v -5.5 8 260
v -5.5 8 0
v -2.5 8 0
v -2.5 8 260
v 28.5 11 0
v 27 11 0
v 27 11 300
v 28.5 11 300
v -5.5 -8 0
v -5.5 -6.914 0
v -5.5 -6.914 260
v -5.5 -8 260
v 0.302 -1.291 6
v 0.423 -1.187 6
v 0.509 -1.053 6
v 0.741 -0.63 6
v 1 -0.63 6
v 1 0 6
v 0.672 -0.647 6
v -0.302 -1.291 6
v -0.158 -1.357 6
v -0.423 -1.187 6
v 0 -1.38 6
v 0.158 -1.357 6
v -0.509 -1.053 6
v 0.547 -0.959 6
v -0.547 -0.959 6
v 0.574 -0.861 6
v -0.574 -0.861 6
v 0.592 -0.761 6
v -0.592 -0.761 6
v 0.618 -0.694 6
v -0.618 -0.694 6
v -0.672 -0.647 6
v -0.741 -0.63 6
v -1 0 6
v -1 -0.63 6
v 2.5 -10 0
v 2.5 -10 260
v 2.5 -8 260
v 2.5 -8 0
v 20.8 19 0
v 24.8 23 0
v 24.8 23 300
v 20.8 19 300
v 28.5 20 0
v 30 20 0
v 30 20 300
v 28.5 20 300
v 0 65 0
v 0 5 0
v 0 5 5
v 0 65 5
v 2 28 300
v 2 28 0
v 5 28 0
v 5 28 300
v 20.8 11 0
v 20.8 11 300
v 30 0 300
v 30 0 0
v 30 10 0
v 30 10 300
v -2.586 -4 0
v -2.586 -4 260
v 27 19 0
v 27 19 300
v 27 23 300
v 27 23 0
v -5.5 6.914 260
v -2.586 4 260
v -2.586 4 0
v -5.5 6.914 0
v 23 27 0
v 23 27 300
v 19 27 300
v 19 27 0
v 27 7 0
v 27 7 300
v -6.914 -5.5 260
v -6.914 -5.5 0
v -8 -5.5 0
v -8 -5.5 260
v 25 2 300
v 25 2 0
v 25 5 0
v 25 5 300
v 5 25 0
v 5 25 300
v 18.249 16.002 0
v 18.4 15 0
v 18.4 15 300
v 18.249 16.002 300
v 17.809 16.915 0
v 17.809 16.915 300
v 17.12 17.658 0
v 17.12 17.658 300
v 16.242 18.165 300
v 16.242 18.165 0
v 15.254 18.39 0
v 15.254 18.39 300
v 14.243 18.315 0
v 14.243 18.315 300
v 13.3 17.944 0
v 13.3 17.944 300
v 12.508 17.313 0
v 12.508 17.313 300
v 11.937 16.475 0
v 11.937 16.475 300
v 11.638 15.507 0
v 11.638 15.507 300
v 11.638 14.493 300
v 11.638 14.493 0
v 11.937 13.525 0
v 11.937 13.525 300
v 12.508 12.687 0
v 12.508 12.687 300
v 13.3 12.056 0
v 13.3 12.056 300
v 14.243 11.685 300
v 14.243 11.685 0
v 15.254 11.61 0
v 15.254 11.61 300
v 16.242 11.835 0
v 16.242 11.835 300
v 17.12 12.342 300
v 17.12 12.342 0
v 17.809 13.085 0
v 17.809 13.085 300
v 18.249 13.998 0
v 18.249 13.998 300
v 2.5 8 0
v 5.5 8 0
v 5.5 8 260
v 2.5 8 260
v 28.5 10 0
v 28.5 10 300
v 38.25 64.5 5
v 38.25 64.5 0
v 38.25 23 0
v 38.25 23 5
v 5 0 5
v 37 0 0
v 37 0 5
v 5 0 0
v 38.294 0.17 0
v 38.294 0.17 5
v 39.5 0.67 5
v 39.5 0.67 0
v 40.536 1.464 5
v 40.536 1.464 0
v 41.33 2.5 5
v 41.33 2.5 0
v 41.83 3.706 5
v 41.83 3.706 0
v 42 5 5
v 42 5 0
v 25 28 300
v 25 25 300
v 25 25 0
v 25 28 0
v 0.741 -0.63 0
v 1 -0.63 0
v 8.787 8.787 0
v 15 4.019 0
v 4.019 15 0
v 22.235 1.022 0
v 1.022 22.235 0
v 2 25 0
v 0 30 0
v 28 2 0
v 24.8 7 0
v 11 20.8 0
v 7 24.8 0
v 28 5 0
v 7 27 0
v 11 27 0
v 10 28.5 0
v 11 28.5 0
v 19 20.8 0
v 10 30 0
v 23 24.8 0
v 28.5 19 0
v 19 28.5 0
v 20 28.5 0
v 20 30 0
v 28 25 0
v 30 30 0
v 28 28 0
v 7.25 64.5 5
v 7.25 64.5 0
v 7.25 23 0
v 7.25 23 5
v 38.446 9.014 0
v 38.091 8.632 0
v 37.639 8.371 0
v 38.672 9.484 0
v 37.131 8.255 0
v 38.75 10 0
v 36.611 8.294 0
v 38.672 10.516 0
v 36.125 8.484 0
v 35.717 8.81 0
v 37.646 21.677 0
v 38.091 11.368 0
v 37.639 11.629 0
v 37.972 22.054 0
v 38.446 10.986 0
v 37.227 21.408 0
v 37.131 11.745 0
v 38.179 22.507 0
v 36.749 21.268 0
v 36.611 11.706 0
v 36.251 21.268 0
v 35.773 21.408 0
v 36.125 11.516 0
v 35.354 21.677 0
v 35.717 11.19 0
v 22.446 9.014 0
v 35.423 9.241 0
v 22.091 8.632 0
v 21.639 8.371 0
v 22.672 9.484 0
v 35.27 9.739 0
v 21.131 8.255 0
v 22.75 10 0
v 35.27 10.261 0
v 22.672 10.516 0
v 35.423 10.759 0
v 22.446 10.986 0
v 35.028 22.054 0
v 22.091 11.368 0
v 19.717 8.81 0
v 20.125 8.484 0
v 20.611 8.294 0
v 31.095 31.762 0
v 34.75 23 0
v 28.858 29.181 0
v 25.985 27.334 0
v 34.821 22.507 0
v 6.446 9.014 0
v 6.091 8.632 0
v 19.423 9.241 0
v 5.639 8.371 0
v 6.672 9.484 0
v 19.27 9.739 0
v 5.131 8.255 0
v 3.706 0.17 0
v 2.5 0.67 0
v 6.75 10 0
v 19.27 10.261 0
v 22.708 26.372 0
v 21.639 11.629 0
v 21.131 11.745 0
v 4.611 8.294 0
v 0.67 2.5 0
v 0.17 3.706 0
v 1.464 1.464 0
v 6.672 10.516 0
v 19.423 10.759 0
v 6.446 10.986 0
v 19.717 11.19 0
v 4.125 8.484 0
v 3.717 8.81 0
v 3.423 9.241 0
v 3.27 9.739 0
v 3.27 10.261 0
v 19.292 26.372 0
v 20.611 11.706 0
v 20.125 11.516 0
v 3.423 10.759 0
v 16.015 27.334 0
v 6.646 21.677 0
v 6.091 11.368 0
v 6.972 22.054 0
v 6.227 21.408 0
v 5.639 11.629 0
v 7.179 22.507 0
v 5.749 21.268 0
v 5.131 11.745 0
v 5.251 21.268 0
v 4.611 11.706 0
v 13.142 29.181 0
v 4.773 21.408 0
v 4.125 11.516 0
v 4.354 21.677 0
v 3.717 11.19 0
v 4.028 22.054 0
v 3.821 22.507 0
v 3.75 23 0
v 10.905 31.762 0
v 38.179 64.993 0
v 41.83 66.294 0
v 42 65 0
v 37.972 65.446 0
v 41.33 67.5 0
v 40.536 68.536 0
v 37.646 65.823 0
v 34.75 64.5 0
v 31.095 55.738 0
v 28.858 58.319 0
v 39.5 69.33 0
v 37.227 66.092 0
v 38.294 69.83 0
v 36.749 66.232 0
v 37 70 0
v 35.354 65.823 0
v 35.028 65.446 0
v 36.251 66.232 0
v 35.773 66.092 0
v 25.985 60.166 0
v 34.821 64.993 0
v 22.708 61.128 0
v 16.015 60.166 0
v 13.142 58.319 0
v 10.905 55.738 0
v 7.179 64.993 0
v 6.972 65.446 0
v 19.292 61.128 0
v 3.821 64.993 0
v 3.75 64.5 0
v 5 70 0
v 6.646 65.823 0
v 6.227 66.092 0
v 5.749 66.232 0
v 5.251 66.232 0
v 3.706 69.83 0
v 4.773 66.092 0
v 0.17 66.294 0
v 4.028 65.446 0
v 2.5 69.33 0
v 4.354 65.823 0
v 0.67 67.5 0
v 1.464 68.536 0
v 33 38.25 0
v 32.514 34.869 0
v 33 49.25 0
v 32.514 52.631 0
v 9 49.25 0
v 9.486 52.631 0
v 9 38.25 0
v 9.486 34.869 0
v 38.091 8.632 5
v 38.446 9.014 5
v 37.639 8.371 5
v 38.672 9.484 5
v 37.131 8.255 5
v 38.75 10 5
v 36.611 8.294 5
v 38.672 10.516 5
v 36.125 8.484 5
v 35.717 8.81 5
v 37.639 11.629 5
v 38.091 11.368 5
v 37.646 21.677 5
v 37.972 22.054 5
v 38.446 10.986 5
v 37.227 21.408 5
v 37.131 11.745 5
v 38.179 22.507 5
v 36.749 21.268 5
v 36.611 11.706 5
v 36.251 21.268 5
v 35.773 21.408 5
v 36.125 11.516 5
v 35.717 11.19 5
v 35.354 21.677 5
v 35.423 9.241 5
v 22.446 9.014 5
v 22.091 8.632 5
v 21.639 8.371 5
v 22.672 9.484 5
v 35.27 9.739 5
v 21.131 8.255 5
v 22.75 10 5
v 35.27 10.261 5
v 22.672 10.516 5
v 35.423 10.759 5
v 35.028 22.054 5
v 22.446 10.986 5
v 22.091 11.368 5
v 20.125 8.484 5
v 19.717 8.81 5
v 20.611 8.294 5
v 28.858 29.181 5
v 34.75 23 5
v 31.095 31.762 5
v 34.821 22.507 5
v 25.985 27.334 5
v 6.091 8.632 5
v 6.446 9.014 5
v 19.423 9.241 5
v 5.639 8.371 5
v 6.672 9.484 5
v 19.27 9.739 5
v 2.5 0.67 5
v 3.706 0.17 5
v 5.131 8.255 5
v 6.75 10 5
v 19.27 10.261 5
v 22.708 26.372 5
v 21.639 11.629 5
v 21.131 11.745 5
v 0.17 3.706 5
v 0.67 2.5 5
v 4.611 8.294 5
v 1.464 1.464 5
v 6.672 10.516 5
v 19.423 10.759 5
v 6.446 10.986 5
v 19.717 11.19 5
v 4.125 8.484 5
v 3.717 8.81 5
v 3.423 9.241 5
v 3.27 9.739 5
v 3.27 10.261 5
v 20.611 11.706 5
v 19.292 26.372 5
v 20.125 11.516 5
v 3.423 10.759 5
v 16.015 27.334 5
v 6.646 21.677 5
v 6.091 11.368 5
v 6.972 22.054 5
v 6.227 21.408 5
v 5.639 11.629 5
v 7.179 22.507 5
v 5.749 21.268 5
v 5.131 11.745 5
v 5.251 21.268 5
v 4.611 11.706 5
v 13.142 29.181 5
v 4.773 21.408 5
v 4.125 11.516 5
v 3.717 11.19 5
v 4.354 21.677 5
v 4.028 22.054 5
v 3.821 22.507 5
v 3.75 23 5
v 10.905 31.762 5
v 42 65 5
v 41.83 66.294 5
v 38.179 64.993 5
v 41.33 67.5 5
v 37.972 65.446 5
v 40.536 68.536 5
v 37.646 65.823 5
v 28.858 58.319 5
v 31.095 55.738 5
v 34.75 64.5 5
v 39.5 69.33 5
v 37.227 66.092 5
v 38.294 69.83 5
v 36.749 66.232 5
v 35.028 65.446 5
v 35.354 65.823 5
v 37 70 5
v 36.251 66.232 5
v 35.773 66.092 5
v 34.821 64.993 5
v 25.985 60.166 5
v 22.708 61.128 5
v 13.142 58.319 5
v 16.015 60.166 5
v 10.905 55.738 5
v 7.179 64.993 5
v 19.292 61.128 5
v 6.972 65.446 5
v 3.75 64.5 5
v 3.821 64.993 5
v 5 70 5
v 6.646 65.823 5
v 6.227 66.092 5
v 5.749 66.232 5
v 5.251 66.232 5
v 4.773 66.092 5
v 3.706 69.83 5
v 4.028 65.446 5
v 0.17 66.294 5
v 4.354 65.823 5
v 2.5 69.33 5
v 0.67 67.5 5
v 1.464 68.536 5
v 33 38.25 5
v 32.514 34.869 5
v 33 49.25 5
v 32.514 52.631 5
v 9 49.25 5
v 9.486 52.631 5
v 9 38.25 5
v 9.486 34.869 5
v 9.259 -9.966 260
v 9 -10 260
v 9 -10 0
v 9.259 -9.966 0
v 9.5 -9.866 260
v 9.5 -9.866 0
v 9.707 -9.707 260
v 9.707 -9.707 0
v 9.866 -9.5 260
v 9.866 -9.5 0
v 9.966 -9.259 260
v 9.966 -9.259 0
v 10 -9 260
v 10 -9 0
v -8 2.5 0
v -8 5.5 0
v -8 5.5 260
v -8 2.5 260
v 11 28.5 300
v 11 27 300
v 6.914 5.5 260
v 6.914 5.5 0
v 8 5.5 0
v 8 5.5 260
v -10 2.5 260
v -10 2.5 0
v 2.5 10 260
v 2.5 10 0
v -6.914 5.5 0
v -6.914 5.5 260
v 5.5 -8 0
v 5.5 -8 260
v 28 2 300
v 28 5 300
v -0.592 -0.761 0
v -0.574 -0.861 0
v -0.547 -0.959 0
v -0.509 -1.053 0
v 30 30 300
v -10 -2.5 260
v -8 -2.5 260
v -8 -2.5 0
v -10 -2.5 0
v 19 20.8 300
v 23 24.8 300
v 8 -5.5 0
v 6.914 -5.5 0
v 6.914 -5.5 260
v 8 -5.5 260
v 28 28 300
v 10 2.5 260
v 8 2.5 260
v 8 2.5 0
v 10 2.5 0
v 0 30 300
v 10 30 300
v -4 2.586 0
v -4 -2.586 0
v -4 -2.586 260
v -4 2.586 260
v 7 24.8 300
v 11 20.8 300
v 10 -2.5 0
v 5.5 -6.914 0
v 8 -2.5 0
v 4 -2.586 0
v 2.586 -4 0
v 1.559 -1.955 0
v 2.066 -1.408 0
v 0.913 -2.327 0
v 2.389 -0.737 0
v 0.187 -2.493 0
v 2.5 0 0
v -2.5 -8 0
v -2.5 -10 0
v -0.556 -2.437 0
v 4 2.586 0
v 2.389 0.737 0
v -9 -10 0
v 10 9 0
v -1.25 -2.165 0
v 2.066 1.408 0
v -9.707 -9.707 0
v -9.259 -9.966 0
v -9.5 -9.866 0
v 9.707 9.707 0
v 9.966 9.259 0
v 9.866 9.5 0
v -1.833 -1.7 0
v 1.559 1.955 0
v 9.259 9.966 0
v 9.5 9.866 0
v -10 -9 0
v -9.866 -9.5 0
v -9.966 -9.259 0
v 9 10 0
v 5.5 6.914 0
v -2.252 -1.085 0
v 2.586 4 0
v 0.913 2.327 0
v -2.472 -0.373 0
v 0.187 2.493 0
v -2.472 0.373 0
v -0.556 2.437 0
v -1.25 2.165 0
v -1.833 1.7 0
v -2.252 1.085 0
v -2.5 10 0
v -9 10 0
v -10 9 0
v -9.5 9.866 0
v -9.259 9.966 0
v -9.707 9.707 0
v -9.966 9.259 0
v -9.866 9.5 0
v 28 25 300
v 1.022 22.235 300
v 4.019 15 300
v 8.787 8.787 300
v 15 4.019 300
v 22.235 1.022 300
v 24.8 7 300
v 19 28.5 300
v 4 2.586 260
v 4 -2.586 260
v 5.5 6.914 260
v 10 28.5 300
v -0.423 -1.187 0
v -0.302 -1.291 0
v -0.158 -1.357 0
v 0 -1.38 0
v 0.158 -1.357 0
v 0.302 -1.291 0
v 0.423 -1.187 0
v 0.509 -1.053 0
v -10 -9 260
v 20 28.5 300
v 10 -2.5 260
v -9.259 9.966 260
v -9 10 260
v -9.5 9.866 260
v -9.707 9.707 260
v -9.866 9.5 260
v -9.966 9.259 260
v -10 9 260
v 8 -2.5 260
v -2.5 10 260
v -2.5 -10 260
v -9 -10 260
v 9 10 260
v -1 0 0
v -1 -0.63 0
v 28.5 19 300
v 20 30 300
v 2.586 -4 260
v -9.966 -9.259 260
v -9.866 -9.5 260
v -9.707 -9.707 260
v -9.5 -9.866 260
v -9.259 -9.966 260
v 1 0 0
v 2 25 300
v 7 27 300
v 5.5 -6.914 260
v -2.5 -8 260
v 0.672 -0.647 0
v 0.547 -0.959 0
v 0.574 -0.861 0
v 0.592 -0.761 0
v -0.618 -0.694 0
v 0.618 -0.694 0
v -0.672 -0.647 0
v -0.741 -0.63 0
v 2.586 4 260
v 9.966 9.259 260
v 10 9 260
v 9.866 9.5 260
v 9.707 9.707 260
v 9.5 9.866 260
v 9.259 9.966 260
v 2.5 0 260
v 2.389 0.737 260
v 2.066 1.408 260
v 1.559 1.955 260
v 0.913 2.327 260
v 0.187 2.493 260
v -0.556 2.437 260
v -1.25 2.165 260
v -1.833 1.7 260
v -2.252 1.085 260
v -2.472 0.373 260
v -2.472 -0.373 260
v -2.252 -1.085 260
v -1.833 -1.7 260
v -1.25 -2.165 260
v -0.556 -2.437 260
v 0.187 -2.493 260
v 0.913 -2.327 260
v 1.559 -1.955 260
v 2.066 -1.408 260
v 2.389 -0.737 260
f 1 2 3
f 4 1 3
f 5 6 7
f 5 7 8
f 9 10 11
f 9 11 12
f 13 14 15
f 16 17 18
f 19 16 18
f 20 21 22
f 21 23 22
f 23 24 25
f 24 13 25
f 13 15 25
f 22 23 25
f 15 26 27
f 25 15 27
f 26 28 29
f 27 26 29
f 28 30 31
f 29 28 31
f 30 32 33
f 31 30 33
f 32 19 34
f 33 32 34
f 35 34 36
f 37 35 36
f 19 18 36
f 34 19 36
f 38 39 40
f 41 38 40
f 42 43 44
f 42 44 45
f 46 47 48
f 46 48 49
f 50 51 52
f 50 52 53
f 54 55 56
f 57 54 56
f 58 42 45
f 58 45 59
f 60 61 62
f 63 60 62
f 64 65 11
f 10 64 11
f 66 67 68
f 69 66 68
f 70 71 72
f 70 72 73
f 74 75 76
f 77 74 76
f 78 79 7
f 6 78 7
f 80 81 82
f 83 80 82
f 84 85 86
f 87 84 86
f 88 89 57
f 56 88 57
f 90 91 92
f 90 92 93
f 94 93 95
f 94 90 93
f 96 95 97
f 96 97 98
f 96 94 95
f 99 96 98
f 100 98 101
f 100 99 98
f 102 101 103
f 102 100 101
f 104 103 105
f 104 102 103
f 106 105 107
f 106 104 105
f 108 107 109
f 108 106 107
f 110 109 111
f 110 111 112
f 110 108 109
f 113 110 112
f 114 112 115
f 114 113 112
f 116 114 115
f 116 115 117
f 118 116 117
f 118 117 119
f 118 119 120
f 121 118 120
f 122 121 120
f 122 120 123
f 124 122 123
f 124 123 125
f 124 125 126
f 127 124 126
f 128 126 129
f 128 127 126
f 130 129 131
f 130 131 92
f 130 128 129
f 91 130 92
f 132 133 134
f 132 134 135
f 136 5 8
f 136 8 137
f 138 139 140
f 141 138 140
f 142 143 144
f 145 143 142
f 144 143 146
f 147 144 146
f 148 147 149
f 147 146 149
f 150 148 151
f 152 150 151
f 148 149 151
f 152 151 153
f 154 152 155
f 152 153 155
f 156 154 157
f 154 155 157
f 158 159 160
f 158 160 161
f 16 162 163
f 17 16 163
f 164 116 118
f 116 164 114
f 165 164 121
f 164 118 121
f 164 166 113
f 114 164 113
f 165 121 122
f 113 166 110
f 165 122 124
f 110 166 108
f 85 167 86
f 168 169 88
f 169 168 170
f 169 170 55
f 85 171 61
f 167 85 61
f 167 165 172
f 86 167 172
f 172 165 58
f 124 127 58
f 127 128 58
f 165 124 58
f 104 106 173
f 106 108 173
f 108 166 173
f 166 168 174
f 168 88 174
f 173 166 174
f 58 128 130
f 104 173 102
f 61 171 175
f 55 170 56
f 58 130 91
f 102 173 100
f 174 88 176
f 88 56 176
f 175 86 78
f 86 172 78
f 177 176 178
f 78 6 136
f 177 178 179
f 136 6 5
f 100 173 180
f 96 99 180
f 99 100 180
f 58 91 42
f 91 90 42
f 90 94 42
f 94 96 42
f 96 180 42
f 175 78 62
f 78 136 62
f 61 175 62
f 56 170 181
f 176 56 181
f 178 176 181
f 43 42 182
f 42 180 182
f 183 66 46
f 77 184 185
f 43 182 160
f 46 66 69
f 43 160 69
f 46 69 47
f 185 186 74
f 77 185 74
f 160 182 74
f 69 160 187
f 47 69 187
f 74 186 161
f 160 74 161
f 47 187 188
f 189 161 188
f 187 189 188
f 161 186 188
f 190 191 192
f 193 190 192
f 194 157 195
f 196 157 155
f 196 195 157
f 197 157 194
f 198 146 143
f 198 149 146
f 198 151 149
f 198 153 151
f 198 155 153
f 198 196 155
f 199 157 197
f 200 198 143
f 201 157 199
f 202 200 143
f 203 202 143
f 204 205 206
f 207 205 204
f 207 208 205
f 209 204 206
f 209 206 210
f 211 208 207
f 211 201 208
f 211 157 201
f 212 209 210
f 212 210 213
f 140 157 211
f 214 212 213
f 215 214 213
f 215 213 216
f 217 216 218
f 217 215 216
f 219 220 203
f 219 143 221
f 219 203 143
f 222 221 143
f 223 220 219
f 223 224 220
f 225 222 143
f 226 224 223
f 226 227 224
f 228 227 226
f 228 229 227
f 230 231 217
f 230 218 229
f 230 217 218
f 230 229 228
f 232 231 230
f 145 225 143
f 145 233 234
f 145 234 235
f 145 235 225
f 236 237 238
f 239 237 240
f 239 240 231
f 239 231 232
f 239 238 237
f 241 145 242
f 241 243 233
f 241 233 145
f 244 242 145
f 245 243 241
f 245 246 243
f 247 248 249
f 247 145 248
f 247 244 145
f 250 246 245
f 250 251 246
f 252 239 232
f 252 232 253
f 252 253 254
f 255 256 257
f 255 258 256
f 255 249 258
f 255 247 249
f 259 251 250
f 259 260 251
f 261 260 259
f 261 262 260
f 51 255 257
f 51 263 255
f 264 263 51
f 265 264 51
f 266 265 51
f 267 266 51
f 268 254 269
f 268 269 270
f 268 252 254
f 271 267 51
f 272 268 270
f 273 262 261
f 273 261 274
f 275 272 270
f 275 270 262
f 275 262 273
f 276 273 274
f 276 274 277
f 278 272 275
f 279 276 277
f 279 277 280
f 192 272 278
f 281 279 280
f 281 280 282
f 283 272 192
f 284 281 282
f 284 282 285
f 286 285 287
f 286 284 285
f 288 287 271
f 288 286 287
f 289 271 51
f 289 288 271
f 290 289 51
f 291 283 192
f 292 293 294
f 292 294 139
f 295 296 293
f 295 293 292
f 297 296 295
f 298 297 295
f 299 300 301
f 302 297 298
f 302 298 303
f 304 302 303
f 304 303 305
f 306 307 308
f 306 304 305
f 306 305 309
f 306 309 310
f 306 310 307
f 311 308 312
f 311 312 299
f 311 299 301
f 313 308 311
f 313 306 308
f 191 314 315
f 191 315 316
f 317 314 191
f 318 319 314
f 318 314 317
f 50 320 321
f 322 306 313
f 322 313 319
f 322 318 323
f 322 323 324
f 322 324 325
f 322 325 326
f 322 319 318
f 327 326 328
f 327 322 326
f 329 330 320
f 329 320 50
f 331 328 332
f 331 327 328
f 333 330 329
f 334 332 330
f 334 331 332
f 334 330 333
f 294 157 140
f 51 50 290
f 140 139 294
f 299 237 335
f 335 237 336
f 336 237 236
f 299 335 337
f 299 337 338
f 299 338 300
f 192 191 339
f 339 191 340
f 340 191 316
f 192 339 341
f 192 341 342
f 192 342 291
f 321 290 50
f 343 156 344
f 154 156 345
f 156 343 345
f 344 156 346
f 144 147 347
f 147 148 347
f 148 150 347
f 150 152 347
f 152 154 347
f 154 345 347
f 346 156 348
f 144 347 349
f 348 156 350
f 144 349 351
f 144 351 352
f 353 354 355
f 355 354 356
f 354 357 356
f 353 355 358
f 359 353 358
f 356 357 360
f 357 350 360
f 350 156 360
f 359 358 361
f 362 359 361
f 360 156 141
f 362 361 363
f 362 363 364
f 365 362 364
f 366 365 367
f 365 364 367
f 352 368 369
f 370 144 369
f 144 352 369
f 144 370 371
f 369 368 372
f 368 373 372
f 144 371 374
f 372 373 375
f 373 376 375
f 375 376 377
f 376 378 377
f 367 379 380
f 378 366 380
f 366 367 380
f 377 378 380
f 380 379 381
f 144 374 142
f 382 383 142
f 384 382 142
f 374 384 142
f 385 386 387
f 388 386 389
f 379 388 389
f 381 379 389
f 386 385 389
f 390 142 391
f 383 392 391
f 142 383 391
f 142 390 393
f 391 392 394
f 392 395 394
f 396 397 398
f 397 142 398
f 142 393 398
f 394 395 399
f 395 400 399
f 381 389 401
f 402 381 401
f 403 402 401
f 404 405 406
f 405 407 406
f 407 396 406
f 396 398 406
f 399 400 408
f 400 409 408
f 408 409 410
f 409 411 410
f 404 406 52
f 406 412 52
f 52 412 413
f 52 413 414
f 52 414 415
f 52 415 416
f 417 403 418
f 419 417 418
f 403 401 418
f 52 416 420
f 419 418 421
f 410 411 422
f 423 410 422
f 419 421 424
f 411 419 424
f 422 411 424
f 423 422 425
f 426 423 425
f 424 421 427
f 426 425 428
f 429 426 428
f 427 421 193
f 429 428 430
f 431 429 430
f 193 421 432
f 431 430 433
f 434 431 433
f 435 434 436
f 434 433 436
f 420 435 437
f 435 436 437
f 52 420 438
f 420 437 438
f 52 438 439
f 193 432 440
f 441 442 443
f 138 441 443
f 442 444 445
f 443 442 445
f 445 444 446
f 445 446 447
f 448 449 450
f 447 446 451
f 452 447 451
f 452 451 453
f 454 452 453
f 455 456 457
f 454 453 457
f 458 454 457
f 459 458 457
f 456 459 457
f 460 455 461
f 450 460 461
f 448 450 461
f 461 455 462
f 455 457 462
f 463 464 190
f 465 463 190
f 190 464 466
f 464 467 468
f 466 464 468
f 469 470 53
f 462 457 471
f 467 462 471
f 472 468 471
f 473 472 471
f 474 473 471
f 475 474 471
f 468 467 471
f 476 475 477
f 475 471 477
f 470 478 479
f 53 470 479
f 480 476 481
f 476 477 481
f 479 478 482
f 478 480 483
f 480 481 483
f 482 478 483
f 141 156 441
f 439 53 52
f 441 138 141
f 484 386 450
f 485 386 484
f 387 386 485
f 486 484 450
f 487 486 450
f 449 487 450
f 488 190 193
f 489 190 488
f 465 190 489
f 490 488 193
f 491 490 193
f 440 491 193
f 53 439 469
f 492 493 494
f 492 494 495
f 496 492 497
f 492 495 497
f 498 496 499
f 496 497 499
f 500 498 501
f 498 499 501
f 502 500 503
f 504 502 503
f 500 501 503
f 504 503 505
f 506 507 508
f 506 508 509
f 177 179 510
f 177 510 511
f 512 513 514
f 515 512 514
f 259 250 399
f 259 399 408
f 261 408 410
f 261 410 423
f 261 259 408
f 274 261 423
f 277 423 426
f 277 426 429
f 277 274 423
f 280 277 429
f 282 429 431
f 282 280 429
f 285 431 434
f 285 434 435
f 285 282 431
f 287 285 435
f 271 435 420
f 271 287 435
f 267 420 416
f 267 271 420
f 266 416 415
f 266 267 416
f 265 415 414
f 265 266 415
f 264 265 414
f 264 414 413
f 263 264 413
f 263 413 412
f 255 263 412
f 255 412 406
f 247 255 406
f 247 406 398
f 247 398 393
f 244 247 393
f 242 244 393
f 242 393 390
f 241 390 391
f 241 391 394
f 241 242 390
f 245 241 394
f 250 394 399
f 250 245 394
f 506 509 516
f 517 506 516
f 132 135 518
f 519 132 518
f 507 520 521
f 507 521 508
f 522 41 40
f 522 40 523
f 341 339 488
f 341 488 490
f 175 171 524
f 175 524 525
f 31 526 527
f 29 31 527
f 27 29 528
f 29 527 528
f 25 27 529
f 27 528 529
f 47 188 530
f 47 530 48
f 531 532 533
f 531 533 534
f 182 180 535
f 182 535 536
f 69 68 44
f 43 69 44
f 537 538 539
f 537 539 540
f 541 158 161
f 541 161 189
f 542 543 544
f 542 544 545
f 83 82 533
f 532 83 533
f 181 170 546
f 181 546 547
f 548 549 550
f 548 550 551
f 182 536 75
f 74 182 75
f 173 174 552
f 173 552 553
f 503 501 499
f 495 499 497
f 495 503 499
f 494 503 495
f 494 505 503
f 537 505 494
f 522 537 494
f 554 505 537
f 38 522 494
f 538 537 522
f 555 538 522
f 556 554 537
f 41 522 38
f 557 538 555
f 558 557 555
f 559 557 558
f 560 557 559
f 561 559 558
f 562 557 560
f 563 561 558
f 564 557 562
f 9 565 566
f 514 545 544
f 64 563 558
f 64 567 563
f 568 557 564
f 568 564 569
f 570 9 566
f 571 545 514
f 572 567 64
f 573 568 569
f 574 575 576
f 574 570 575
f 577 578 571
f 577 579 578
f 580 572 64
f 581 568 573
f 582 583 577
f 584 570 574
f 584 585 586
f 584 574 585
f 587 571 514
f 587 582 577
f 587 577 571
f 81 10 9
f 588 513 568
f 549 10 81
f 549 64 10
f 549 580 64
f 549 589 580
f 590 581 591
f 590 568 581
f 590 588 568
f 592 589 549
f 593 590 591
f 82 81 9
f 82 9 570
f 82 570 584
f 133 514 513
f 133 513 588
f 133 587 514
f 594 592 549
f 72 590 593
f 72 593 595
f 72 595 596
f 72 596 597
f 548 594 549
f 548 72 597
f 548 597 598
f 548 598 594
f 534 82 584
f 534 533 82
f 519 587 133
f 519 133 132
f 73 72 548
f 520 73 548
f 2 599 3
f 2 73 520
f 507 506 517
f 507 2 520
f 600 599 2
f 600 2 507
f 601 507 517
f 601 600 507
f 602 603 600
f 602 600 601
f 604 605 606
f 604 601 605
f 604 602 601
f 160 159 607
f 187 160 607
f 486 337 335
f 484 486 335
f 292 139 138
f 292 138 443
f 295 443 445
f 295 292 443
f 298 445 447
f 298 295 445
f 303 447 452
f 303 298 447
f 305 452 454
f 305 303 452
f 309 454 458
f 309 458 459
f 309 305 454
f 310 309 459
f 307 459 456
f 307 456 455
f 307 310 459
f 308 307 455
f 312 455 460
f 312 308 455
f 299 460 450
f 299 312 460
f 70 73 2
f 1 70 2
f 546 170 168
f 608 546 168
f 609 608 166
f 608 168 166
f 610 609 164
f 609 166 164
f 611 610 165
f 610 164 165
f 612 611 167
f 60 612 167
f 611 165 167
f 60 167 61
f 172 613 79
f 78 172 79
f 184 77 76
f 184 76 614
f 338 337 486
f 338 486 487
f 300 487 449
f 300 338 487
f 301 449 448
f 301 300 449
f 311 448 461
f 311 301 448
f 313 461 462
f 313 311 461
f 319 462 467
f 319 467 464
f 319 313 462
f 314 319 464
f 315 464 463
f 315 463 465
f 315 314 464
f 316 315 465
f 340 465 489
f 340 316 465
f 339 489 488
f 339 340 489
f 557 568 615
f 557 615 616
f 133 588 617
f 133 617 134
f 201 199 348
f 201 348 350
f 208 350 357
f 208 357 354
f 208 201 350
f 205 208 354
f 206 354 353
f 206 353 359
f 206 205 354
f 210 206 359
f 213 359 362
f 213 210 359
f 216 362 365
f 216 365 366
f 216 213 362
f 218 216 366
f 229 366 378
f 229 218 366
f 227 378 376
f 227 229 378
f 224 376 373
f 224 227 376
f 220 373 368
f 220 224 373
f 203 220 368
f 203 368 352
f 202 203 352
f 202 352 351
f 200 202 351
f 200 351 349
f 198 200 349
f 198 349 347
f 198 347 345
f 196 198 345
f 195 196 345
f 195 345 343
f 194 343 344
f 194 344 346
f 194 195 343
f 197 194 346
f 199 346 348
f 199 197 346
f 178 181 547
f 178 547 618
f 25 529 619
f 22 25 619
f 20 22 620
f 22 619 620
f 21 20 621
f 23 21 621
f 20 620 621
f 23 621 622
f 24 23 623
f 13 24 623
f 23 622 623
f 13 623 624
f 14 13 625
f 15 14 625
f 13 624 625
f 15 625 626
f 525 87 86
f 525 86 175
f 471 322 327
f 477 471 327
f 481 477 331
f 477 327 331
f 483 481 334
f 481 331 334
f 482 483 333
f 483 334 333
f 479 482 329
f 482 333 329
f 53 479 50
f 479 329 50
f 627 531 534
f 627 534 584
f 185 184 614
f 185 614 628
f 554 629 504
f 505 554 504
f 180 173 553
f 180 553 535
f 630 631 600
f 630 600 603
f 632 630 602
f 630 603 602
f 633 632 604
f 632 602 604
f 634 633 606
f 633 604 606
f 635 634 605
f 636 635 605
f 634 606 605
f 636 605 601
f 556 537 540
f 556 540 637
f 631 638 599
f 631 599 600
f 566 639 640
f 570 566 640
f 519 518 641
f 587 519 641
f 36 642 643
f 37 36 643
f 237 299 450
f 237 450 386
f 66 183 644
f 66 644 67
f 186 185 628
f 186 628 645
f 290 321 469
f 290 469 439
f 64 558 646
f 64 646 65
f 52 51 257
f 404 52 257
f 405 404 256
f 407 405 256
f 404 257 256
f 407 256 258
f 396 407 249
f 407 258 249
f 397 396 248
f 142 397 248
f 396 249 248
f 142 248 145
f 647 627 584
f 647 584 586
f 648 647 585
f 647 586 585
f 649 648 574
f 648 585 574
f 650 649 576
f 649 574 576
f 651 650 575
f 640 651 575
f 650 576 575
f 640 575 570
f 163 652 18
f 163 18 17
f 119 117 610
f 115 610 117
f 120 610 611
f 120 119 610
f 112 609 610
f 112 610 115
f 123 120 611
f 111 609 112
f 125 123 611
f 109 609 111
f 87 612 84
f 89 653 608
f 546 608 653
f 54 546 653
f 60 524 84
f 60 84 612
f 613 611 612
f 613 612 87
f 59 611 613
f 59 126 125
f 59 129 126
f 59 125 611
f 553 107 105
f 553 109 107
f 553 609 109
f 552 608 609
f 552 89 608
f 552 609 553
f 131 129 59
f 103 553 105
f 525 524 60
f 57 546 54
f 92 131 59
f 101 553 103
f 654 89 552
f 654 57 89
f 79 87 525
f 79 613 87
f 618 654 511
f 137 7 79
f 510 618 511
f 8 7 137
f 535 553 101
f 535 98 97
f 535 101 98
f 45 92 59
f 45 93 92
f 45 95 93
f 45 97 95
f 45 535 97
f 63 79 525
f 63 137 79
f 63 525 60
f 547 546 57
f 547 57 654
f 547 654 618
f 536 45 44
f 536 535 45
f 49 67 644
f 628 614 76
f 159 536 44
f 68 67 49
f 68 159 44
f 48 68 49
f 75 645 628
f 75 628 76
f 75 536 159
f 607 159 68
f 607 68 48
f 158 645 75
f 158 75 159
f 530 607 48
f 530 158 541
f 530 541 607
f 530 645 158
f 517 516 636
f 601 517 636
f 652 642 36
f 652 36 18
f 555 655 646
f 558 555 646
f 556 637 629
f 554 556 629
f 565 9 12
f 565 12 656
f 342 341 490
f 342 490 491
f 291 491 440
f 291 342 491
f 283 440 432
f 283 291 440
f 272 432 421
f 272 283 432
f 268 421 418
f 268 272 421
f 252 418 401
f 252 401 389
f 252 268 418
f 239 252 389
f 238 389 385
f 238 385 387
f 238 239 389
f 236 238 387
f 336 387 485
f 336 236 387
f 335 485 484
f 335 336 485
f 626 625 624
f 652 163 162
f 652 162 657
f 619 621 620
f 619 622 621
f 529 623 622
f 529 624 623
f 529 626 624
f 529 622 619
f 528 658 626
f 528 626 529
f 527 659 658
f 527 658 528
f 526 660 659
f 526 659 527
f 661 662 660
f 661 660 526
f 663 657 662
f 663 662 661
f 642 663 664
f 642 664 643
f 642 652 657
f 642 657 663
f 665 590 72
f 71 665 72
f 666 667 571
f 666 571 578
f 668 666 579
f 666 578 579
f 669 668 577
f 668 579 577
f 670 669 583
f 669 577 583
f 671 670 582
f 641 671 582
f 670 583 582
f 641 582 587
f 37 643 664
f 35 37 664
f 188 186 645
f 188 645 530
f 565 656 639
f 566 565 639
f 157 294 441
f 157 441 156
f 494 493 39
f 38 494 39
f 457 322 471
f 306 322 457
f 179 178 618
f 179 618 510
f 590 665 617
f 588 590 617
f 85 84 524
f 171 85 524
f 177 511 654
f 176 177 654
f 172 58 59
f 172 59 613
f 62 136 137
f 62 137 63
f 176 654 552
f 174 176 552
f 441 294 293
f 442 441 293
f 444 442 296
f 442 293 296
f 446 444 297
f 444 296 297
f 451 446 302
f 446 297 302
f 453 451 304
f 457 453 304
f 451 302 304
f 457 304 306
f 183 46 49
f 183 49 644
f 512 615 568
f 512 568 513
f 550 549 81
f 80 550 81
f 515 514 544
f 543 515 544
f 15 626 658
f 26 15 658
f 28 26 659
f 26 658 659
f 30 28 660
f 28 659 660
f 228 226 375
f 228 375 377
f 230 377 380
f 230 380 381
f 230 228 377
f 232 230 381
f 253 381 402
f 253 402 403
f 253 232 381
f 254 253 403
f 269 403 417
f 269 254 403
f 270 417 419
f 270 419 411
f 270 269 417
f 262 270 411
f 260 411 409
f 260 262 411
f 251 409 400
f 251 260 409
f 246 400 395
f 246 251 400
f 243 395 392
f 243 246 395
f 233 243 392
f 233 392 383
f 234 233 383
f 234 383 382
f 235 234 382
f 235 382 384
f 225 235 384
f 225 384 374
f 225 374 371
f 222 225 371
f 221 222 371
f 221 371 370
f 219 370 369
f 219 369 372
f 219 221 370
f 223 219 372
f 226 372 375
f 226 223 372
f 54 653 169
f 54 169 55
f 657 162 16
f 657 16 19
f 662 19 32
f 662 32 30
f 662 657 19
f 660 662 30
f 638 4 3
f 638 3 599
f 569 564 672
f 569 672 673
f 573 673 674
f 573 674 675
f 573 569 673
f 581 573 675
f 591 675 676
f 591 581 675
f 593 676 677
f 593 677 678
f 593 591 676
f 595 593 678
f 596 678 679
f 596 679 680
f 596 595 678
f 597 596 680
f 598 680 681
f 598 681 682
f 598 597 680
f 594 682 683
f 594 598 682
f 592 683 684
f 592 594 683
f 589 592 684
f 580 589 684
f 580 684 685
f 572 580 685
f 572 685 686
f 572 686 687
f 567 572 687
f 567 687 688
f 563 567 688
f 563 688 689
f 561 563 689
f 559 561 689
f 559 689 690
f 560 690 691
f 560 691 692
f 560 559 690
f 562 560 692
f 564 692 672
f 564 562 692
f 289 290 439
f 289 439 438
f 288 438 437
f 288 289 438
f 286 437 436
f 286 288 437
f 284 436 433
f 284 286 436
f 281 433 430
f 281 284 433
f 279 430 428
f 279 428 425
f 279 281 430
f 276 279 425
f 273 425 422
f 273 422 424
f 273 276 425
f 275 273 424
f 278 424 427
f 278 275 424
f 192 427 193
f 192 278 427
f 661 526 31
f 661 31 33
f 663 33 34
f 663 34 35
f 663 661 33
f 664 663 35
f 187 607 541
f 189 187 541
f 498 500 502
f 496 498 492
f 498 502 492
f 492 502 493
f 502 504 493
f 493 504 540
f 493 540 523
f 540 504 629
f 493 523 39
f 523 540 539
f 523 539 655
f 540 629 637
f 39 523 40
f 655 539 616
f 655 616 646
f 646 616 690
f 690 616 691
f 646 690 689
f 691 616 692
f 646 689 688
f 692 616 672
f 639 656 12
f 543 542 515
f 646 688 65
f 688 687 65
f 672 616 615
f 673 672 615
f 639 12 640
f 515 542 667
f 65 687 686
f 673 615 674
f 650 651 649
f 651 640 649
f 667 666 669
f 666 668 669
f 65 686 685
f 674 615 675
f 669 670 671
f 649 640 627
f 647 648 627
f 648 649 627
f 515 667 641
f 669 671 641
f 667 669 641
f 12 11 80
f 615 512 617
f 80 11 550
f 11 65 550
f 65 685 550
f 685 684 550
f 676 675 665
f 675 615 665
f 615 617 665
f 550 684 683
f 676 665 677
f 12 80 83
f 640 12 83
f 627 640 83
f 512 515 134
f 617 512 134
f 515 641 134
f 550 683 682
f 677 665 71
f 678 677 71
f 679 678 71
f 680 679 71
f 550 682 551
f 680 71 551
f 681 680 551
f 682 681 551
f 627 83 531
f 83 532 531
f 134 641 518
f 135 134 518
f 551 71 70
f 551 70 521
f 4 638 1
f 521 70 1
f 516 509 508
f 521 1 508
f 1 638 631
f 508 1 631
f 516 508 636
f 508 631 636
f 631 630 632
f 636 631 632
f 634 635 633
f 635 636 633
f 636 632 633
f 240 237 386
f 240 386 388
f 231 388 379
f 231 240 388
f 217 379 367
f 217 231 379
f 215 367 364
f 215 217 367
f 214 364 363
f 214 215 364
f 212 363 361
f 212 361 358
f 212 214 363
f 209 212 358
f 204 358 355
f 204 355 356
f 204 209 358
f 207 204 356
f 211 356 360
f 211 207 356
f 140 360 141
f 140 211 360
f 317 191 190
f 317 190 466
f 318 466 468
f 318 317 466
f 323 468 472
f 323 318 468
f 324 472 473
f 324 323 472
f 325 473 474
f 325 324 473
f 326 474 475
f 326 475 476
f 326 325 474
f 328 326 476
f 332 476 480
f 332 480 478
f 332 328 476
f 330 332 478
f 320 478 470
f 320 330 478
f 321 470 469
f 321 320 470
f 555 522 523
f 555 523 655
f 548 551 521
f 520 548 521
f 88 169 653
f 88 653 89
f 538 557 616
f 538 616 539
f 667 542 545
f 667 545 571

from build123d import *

# Parameters (mm, degrees)
SKETCH_R     = 1.75
PAD_DEPTH    = 5
SKETCH003_R  = 3.4
SKETCH003_W  = 3
SKETCH003_H  = 3
PAD001_DEPTH = 300
PAD002_DEPTH = 6
SKETCH005_R  = 2.5
PAD003_DEPTH = 260


with BuildPart() as nemamount:
    # Sketch → Pad (new body)
    with BuildSketch(Plane.XY):
        with BuildLine():
            Line((5, 70), (37, 70))
            ThreePointArc((42, 65), (40.535534, 68.535534), (37, 70))
            Line((42, 65), (42, 5))
            ThreePointArc((37, 0), (40.535534, 1.464466), (42, 5))
            Line((37, 0), (5, 0))
            ThreePointArc((0, 5), (1.464466, 1.464466), (5, 0))
            Line((0, 5), (0, 65))
            ThreePointArc((5, 70), (1.464466, 68.535534), (0, 65))
        make_face()
        with Locations((5, 10)):
            Circle(SKETCH_R, mode=Mode.SUBTRACT)
        with Locations((37, 10)):
            Circle(SKETCH_R, mode=Mode.SUBTRACT)
        with Locations((21, 10)):
            Circle(SKETCH_R, mode=Mode.SUBTRACT)
        with BuildLine():
            ThreePointArc((7.25, 64.5), (5.5, 66.25), (3.75, 64.5))
            Line((3.75, 64.5), (3.75, 23))
            ThreePointArc((3.75, 23), (5.5, 21.25), (7.25, 23))
            Line((7.25, 64.5), (7.25, 23))
        make_face(mode=Mode.SUBTRACT)
        with BuildLine():
            ThreePointArc((38.25, 64.5), (36.5, 66.25), (34.75, 64.5))
            Line((34.75, 64.5), (34.75, 23))
            ThreePointArc((34.75, 23), (36.5, 21.25), (38.25, 23))
            Line((38.25, 64.5), (38.25, 23))
        make_face(mode=Mode.SUBTRACT)
        with BuildLine():
            ThreePointArc((33, 49.25), (21, 61.25), (9, 49.25))
            Line((9, 49.25), (9, 38.25))
            ThreePointArc((9, 38.25), (21, 26.25), (33, 38.25))
            Line((33, 49.25), (33, 38.25))
        make_face(mode=Mode.SUBTRACT)
    extrude(amount=PAD_DEPTH)


with BuildPart() as profile3030r:
    # Sketch003 → Pad001 (new body)
    with BuildSketch(Plane.XY):
        with BuildLine():
            ThreePointArc((0, 30), (8.786797, 8.786797), (30, 0))
            Line((30, 0), (30, 10))
            Line((28.5, 10), (30, 10))
            Line((28.5, 11), (28.5, 10))
            Line((27, 11), (28.5, 11))
            Line((27, 7), (27, 11))
            Line((24.8, 7), (27, 7))
            Line((20.8, 11), (24.8, 7))
            Line((20.8, 19), (20.8, 11))
            Line((24.8, 23), (20.8, 19))
            Line((27, 23), (24.8, 23))
            Line((27, 19), (27, 23))
            Line((28.5, 19), (27, 19))
            Line((28.5, 20), (28.5, 19))
            Line((30, 20), (28.5, 20))
            Line((30, 30), (30, 20))
            Line((20, 30), (30, 30))
            Line((20, 28.5), (20, 30))
            Line((19, 28.5), (20, 28.5))
            Line((19, 27), (19, 28.5))
            Line((23, 27), (19, 27))
            Line((23, 24.8), (23, 27))
            Line((19, 20.8), (23, 24.8))
            Line((11, 20.8), (19, 20.8))
            Line((7, 24.8), (11, 20.8))
            Line((7, 27), (7, 24.8))
            Line((11, 27), (7, 27))
            Line((11, 28.5), (11, 27))
            Line((10, 28.5), (11, 28.5))
            Line((10, 30), (10, 28.5))
            Line((0, 30), (10, 30))
        make_face()
        with Locations((15, 15)):
            Circle(SKETCH003_R, mode=Mode.SUBTRACT)
        with Locations((3.5, 26.5)):
            Rectangle(SKETCH003_W, SKETCH003_H, mode=Mode.SUBTRACT)
        with Locations((26.5, 26.5)):
            Rectangle(SKETCH003_W, SKETCH003_H, mode=Mode.SUBTRACT)
        with Locations((26.5, 3.5)):
            Rectangle(SKETCH003_W, SKETCH003_H, mode=Mode.SUBTRACT)
    extrude(amount=PAD001_DEPTH)


with BuildPart() as gt2belt:
    # Sketch004 → Pad002 (new body)
    with BuildSketch(Plane.XY):
        with BuildLine():
            Line((-1, 0), (0, 0))
            Line((0, 0), (1, 0))
            Line((1, 0), (1, -0.63))
            Line((0.741036, -0.63), (1, -0.63))
            ThreePointArc((0.741036, -0.63), (0.641799, -0.667519), (0.592206, -0.761308))
            ThreePointArc((0.509091, -1.053295), (0.561793, -0.910474), (0.592206, -0.761308))
            ThreePointArc((-0.509091, -1.053295), (0, -1.38), (0.509091, -1.053295))
            ThreePointArc((-0.592206, -0.761308), (-0.561793, -0.910474), (-0.509091, -1.053295))
            ThreePointArc((-0.592206, -0.761308), (-0.641799, -0.667519), (-0.741036, -0.63))
            Line((-1, -0.63), (-0.741036, -0.63))
            Line((-1, 0), (-1, -0.63))
        make_face()
    extrude(amount=PAD002_DEPTH)


with BuildPart() as profile2020:
    # Sketch005 → Pad003 (new body)
    with BuildSketch(Plane.XY):
        with BuildLine():
            Line((-4, -2.585786), (-4, 2.585787))
            Line((-4, 2.585787), (-6.914214, 5.500001))
            Line((-6.914214, 5.500001), (-8, 5.500001))
            Line((-8, 5.500001), (-8, 2.500001))
            Line((-8, 2.500001), (-10, 2.500001))
            Line((-10, 2.500001), (-10, 9.000001))
            ThreePointArc((-9, 10), (-9.707107, 9.707107), (-10, 9.000001))
            Line((-2.5, 10), (-9, 10))
            Line((-2.5, 8), (-2.5, 10))
            Line((-5.5, 8), (-2.5, 8))
            Line((-5.5, 6.914214), (-5.5, 8))
            Line((-2.585786, 4), (-5.5, 6.914214))
            Line((2.585786, 4), (-2.585786, 4))
            Line((2.585786, 4), (5.5, 6.914214))
            Line((5.5, 6.914214), (5.5, 8))
            Line((5.5, 8), (2.5, 8))
            Line((2.5, 8), (2.5, 10))
            Line((2.5, 10), (9, 10))
            ThreePointArc((10, 9.000001), (9.707107, 9.707107), (9, 10))
            Line((10, 2.500001), (10, 9.000001))
            Line((8, 2.500001), (10, 2.500001))
            Line((8, 5.500001), (8, 2.500001))
            Line((6.914214, 5.500001), (8, 5.500001))
            Line((4, 2.585787), (6.914214, 5.500001))
            Line((4, 2.585787), (4, -2.585786))
            Line((4, -2.585786), (6.914214, -5.500001))
            Line((6.914214, -5.500001), (8, -5.500001))
            Line((8, -5.500001), (8, -2.500001))
            Line((8, -2.500001), (10, -2.500001))
            Line((10, -2.500001), (10, -9.000001))
            ThreePointArc((9, -10), (9.707107, -9.707107), (10, -9.000001))
            Line((9, -10), (2.5, -10))
            Line((2.5, -10), (2.5, -8))
            Line((2.5, -8), (5.5, -8))
            Line((5.5, -8), (5.5, -6.914214))
            Line((5.5, -6.914214), (2.585786, -4))
            Line((2.585786, -4), (-2.585786, -4))
            Line((-2.585786, -4), (-5.5, -6.914214))
            Line((-5.5, -6.914214), (-5.5, -8))
            Line((-5.5, -8), (-2.5, -8))
            Line((-2.5, -8), (-2.5, -10))
            Line((-2.5, -10), (-9, -10))
            ThreePointArc((-10, -9.000001), (-9.707107, -9.707107), (-9, -10))
            Line((-10, -2.500001), (-10, -9.000001))
            Line((-8, -2.500001), (-10, -2.500001))
            Line((-8, -5.500001), (-8, -2.500001))
            Line((-6.914214, -5.500001), (-8, -5.500001))
            Line((-4, -2.585786), (-6.914214, -5.500001))
        make_face()
        Circle(SKETCH005_R, mode=Mode.SUBTRACT)
    extrude(amount=PAD003_DEPTH)


solid = Compound([nemamount.part, profile3030r.part, gt2belt.part, profile2020.part])
